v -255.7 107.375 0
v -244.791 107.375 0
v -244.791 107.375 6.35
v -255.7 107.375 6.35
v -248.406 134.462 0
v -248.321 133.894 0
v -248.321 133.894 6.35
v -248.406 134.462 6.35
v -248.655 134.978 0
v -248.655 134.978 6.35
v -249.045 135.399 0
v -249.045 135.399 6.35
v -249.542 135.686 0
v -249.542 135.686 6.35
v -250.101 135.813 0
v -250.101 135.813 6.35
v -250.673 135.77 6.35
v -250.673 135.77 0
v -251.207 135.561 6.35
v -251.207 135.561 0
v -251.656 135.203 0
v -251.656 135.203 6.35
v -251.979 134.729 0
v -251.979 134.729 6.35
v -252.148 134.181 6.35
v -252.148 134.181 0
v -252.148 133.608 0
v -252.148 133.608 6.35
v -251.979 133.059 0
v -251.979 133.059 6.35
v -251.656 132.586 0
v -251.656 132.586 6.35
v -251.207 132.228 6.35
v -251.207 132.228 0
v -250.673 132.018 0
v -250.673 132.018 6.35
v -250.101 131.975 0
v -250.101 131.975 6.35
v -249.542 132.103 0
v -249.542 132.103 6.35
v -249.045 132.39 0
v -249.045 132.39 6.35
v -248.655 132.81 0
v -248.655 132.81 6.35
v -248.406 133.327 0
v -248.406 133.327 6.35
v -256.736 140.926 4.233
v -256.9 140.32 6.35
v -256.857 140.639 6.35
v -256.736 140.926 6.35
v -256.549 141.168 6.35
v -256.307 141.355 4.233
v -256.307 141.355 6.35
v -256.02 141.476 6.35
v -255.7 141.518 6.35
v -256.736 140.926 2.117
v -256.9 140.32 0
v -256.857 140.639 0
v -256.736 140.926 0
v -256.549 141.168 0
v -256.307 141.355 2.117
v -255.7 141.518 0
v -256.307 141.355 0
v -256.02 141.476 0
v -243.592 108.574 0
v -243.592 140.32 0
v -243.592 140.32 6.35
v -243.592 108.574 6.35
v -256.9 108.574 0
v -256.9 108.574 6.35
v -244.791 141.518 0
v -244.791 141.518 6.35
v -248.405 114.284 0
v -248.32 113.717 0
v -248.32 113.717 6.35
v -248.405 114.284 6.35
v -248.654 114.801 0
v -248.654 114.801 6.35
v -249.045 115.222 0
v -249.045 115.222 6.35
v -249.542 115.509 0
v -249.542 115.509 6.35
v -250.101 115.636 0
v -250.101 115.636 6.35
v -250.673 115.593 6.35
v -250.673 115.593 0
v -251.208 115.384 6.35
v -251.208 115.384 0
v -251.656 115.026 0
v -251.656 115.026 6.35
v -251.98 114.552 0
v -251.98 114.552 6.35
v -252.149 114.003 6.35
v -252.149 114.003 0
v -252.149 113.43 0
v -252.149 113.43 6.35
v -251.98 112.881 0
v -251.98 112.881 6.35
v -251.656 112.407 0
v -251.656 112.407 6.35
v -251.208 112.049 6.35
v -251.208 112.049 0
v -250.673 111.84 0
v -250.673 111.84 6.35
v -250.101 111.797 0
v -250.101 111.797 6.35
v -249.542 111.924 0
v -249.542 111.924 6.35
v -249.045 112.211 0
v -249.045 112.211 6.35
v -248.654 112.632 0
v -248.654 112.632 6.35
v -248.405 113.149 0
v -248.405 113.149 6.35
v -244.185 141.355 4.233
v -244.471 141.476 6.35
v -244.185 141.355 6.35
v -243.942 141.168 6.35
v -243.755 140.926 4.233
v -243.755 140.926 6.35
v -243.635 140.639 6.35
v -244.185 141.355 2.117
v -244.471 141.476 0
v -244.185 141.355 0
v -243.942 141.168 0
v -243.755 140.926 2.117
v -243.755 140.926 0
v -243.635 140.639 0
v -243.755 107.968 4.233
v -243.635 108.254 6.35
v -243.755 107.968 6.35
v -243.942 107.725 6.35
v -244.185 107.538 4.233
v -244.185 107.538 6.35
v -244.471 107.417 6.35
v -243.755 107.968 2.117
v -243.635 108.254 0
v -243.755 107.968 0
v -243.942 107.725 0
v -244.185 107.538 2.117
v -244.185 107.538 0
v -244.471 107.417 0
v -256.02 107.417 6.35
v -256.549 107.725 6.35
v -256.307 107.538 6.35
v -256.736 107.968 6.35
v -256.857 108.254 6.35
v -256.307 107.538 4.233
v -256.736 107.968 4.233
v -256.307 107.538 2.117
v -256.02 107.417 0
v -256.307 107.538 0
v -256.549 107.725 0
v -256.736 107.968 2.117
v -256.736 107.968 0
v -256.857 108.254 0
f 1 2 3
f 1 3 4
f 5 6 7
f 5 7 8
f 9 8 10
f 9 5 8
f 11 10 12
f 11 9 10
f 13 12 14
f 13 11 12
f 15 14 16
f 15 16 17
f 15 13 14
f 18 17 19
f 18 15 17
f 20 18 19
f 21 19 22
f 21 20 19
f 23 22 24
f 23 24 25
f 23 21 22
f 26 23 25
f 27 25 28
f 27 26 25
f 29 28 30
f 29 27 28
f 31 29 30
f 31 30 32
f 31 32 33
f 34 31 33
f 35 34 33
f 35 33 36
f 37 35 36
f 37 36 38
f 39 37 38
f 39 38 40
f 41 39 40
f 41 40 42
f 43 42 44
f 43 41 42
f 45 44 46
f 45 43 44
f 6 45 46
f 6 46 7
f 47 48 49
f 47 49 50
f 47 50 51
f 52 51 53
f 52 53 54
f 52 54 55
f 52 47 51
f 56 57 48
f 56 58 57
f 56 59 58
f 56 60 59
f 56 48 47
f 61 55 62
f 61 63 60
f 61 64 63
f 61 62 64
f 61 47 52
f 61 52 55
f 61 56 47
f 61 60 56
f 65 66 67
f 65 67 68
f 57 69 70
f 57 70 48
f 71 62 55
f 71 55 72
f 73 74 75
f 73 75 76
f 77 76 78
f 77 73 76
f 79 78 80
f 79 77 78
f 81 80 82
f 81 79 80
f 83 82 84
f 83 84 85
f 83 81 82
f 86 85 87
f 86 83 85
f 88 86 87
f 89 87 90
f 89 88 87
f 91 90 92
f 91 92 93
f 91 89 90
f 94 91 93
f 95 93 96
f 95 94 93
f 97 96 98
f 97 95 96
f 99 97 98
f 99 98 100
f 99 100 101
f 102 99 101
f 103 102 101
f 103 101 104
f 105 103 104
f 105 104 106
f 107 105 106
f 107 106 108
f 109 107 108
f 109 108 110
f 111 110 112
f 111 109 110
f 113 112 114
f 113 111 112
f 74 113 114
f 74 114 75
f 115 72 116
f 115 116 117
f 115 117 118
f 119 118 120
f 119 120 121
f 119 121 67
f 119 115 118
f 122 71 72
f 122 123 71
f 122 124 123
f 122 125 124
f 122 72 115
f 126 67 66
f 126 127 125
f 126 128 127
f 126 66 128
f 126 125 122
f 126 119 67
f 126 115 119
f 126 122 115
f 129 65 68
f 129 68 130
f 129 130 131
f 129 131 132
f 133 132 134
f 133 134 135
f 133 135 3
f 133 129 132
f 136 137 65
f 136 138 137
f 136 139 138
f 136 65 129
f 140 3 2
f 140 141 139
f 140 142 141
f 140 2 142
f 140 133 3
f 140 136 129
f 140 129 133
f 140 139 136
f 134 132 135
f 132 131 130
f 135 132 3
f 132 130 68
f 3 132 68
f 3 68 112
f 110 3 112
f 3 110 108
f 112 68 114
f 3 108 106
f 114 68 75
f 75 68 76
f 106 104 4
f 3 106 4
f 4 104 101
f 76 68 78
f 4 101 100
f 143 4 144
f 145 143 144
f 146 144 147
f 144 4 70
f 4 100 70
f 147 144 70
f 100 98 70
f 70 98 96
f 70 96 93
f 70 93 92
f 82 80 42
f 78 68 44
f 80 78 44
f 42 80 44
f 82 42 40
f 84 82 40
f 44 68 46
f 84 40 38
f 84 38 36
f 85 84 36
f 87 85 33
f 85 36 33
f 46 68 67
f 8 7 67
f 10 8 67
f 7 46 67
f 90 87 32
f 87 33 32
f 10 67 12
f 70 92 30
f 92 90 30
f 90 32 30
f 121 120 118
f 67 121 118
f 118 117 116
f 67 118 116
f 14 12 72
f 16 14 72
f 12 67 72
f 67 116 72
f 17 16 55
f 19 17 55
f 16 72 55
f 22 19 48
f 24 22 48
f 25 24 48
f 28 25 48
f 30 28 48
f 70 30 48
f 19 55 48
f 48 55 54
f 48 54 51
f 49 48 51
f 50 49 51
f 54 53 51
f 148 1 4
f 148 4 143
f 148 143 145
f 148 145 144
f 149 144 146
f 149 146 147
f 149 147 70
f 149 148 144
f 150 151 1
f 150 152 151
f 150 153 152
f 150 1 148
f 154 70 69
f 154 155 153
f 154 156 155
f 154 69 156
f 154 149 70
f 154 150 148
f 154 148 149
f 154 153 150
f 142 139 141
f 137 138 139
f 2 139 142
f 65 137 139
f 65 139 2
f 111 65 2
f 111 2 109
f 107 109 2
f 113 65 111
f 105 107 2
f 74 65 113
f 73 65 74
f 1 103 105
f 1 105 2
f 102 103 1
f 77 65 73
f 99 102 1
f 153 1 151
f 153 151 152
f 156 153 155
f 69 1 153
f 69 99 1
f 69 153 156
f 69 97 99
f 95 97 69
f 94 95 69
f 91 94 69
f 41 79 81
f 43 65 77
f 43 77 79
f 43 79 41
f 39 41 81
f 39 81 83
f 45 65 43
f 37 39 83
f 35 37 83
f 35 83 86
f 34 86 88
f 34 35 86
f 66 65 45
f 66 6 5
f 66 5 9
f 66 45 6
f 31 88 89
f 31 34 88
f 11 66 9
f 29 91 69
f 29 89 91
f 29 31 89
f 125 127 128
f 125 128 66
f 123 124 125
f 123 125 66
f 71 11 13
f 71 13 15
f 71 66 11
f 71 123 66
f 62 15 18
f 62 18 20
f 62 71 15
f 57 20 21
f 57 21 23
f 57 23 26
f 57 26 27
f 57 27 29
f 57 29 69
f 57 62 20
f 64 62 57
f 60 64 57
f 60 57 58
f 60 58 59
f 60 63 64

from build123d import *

# Parameters (mm, degrees)
MODEL_R             = 1.9243
MODEL_R_2           = 1.92515
BOSS_EXTRUDE1_DEPTH = 6.35


with BuildPart() as part:
    # Model → Boss-Extrude1 (new body)
    with BuildSketch(Plane.XY):
        with BuildLine():
            Line((-255.7004, 141.5182), (-244.7908, 141.5182))
            add(Edge.make_bspline(
                [(-244.7908, 141.5182), (-244.1268, 141.5182), (-243.5919, 140.9838), (-243.5919, 140.3197)],
                knots=[0.111111111, 0.111111111, 0.111111111, 0.111111111, 0.222222222, 0.222222222, 0.222222222, 0.222222222], degree=3))
            Line((-243.5919, 140.3197), (-243.5919, 108.5737))
            add(Edge.make_bspline(
                [(-243.5919, 108.5737), (-243.5919, 107.9096), (-244.1268, 107.3747), (-244.7908, 107.3747)],
                knots=[0.333333333, 0.333333333, 0.333333333, 0.333333333, 0.444444444, 0.444444444, 0.444444444, 0.444444444], degree=3))
            Line((-244.7908, 107.3747), (-255.7004, 107.3747))
            add(Edge.make_bspline(
                [(-255.7004, 107.3747), (-256.3648, 107.3747), (-256.8997, 107.9096), (-256.8997, 108.5737)],
                knots=[0.555555556, 0.555555556, 0.555555556, 0.555555556, 0.666666667, 0.666666667, 0.666666667, 0.666666667], degree=3))
            Line((-256.8997, 108.5737), (-256.8997, 140.3197))
            add(Edge.make_bspline(
                [(-256.8997, 140.3197), (-256.8997, 140.9838), (-256.3648, 141.5182), (-255.7004, 141.5182)],
                knots=[0.777777778, 0.777777778, 0.777777778, 0.777777778, 1, 1, 1, 1], degree=3))
        make_face()
        with Locations((-250.245, 133.8944)):
            Circle(MODEL_R, mode=Mode.SUBTRACT)
        with Locations((-250.245, 113.71655)):
            Circle(MODEL_R_2, mode=Mode.SUBTRACT)
    extrude(amount=BOSS_EXTRUDE1_DEPTH)


solid = part.part
